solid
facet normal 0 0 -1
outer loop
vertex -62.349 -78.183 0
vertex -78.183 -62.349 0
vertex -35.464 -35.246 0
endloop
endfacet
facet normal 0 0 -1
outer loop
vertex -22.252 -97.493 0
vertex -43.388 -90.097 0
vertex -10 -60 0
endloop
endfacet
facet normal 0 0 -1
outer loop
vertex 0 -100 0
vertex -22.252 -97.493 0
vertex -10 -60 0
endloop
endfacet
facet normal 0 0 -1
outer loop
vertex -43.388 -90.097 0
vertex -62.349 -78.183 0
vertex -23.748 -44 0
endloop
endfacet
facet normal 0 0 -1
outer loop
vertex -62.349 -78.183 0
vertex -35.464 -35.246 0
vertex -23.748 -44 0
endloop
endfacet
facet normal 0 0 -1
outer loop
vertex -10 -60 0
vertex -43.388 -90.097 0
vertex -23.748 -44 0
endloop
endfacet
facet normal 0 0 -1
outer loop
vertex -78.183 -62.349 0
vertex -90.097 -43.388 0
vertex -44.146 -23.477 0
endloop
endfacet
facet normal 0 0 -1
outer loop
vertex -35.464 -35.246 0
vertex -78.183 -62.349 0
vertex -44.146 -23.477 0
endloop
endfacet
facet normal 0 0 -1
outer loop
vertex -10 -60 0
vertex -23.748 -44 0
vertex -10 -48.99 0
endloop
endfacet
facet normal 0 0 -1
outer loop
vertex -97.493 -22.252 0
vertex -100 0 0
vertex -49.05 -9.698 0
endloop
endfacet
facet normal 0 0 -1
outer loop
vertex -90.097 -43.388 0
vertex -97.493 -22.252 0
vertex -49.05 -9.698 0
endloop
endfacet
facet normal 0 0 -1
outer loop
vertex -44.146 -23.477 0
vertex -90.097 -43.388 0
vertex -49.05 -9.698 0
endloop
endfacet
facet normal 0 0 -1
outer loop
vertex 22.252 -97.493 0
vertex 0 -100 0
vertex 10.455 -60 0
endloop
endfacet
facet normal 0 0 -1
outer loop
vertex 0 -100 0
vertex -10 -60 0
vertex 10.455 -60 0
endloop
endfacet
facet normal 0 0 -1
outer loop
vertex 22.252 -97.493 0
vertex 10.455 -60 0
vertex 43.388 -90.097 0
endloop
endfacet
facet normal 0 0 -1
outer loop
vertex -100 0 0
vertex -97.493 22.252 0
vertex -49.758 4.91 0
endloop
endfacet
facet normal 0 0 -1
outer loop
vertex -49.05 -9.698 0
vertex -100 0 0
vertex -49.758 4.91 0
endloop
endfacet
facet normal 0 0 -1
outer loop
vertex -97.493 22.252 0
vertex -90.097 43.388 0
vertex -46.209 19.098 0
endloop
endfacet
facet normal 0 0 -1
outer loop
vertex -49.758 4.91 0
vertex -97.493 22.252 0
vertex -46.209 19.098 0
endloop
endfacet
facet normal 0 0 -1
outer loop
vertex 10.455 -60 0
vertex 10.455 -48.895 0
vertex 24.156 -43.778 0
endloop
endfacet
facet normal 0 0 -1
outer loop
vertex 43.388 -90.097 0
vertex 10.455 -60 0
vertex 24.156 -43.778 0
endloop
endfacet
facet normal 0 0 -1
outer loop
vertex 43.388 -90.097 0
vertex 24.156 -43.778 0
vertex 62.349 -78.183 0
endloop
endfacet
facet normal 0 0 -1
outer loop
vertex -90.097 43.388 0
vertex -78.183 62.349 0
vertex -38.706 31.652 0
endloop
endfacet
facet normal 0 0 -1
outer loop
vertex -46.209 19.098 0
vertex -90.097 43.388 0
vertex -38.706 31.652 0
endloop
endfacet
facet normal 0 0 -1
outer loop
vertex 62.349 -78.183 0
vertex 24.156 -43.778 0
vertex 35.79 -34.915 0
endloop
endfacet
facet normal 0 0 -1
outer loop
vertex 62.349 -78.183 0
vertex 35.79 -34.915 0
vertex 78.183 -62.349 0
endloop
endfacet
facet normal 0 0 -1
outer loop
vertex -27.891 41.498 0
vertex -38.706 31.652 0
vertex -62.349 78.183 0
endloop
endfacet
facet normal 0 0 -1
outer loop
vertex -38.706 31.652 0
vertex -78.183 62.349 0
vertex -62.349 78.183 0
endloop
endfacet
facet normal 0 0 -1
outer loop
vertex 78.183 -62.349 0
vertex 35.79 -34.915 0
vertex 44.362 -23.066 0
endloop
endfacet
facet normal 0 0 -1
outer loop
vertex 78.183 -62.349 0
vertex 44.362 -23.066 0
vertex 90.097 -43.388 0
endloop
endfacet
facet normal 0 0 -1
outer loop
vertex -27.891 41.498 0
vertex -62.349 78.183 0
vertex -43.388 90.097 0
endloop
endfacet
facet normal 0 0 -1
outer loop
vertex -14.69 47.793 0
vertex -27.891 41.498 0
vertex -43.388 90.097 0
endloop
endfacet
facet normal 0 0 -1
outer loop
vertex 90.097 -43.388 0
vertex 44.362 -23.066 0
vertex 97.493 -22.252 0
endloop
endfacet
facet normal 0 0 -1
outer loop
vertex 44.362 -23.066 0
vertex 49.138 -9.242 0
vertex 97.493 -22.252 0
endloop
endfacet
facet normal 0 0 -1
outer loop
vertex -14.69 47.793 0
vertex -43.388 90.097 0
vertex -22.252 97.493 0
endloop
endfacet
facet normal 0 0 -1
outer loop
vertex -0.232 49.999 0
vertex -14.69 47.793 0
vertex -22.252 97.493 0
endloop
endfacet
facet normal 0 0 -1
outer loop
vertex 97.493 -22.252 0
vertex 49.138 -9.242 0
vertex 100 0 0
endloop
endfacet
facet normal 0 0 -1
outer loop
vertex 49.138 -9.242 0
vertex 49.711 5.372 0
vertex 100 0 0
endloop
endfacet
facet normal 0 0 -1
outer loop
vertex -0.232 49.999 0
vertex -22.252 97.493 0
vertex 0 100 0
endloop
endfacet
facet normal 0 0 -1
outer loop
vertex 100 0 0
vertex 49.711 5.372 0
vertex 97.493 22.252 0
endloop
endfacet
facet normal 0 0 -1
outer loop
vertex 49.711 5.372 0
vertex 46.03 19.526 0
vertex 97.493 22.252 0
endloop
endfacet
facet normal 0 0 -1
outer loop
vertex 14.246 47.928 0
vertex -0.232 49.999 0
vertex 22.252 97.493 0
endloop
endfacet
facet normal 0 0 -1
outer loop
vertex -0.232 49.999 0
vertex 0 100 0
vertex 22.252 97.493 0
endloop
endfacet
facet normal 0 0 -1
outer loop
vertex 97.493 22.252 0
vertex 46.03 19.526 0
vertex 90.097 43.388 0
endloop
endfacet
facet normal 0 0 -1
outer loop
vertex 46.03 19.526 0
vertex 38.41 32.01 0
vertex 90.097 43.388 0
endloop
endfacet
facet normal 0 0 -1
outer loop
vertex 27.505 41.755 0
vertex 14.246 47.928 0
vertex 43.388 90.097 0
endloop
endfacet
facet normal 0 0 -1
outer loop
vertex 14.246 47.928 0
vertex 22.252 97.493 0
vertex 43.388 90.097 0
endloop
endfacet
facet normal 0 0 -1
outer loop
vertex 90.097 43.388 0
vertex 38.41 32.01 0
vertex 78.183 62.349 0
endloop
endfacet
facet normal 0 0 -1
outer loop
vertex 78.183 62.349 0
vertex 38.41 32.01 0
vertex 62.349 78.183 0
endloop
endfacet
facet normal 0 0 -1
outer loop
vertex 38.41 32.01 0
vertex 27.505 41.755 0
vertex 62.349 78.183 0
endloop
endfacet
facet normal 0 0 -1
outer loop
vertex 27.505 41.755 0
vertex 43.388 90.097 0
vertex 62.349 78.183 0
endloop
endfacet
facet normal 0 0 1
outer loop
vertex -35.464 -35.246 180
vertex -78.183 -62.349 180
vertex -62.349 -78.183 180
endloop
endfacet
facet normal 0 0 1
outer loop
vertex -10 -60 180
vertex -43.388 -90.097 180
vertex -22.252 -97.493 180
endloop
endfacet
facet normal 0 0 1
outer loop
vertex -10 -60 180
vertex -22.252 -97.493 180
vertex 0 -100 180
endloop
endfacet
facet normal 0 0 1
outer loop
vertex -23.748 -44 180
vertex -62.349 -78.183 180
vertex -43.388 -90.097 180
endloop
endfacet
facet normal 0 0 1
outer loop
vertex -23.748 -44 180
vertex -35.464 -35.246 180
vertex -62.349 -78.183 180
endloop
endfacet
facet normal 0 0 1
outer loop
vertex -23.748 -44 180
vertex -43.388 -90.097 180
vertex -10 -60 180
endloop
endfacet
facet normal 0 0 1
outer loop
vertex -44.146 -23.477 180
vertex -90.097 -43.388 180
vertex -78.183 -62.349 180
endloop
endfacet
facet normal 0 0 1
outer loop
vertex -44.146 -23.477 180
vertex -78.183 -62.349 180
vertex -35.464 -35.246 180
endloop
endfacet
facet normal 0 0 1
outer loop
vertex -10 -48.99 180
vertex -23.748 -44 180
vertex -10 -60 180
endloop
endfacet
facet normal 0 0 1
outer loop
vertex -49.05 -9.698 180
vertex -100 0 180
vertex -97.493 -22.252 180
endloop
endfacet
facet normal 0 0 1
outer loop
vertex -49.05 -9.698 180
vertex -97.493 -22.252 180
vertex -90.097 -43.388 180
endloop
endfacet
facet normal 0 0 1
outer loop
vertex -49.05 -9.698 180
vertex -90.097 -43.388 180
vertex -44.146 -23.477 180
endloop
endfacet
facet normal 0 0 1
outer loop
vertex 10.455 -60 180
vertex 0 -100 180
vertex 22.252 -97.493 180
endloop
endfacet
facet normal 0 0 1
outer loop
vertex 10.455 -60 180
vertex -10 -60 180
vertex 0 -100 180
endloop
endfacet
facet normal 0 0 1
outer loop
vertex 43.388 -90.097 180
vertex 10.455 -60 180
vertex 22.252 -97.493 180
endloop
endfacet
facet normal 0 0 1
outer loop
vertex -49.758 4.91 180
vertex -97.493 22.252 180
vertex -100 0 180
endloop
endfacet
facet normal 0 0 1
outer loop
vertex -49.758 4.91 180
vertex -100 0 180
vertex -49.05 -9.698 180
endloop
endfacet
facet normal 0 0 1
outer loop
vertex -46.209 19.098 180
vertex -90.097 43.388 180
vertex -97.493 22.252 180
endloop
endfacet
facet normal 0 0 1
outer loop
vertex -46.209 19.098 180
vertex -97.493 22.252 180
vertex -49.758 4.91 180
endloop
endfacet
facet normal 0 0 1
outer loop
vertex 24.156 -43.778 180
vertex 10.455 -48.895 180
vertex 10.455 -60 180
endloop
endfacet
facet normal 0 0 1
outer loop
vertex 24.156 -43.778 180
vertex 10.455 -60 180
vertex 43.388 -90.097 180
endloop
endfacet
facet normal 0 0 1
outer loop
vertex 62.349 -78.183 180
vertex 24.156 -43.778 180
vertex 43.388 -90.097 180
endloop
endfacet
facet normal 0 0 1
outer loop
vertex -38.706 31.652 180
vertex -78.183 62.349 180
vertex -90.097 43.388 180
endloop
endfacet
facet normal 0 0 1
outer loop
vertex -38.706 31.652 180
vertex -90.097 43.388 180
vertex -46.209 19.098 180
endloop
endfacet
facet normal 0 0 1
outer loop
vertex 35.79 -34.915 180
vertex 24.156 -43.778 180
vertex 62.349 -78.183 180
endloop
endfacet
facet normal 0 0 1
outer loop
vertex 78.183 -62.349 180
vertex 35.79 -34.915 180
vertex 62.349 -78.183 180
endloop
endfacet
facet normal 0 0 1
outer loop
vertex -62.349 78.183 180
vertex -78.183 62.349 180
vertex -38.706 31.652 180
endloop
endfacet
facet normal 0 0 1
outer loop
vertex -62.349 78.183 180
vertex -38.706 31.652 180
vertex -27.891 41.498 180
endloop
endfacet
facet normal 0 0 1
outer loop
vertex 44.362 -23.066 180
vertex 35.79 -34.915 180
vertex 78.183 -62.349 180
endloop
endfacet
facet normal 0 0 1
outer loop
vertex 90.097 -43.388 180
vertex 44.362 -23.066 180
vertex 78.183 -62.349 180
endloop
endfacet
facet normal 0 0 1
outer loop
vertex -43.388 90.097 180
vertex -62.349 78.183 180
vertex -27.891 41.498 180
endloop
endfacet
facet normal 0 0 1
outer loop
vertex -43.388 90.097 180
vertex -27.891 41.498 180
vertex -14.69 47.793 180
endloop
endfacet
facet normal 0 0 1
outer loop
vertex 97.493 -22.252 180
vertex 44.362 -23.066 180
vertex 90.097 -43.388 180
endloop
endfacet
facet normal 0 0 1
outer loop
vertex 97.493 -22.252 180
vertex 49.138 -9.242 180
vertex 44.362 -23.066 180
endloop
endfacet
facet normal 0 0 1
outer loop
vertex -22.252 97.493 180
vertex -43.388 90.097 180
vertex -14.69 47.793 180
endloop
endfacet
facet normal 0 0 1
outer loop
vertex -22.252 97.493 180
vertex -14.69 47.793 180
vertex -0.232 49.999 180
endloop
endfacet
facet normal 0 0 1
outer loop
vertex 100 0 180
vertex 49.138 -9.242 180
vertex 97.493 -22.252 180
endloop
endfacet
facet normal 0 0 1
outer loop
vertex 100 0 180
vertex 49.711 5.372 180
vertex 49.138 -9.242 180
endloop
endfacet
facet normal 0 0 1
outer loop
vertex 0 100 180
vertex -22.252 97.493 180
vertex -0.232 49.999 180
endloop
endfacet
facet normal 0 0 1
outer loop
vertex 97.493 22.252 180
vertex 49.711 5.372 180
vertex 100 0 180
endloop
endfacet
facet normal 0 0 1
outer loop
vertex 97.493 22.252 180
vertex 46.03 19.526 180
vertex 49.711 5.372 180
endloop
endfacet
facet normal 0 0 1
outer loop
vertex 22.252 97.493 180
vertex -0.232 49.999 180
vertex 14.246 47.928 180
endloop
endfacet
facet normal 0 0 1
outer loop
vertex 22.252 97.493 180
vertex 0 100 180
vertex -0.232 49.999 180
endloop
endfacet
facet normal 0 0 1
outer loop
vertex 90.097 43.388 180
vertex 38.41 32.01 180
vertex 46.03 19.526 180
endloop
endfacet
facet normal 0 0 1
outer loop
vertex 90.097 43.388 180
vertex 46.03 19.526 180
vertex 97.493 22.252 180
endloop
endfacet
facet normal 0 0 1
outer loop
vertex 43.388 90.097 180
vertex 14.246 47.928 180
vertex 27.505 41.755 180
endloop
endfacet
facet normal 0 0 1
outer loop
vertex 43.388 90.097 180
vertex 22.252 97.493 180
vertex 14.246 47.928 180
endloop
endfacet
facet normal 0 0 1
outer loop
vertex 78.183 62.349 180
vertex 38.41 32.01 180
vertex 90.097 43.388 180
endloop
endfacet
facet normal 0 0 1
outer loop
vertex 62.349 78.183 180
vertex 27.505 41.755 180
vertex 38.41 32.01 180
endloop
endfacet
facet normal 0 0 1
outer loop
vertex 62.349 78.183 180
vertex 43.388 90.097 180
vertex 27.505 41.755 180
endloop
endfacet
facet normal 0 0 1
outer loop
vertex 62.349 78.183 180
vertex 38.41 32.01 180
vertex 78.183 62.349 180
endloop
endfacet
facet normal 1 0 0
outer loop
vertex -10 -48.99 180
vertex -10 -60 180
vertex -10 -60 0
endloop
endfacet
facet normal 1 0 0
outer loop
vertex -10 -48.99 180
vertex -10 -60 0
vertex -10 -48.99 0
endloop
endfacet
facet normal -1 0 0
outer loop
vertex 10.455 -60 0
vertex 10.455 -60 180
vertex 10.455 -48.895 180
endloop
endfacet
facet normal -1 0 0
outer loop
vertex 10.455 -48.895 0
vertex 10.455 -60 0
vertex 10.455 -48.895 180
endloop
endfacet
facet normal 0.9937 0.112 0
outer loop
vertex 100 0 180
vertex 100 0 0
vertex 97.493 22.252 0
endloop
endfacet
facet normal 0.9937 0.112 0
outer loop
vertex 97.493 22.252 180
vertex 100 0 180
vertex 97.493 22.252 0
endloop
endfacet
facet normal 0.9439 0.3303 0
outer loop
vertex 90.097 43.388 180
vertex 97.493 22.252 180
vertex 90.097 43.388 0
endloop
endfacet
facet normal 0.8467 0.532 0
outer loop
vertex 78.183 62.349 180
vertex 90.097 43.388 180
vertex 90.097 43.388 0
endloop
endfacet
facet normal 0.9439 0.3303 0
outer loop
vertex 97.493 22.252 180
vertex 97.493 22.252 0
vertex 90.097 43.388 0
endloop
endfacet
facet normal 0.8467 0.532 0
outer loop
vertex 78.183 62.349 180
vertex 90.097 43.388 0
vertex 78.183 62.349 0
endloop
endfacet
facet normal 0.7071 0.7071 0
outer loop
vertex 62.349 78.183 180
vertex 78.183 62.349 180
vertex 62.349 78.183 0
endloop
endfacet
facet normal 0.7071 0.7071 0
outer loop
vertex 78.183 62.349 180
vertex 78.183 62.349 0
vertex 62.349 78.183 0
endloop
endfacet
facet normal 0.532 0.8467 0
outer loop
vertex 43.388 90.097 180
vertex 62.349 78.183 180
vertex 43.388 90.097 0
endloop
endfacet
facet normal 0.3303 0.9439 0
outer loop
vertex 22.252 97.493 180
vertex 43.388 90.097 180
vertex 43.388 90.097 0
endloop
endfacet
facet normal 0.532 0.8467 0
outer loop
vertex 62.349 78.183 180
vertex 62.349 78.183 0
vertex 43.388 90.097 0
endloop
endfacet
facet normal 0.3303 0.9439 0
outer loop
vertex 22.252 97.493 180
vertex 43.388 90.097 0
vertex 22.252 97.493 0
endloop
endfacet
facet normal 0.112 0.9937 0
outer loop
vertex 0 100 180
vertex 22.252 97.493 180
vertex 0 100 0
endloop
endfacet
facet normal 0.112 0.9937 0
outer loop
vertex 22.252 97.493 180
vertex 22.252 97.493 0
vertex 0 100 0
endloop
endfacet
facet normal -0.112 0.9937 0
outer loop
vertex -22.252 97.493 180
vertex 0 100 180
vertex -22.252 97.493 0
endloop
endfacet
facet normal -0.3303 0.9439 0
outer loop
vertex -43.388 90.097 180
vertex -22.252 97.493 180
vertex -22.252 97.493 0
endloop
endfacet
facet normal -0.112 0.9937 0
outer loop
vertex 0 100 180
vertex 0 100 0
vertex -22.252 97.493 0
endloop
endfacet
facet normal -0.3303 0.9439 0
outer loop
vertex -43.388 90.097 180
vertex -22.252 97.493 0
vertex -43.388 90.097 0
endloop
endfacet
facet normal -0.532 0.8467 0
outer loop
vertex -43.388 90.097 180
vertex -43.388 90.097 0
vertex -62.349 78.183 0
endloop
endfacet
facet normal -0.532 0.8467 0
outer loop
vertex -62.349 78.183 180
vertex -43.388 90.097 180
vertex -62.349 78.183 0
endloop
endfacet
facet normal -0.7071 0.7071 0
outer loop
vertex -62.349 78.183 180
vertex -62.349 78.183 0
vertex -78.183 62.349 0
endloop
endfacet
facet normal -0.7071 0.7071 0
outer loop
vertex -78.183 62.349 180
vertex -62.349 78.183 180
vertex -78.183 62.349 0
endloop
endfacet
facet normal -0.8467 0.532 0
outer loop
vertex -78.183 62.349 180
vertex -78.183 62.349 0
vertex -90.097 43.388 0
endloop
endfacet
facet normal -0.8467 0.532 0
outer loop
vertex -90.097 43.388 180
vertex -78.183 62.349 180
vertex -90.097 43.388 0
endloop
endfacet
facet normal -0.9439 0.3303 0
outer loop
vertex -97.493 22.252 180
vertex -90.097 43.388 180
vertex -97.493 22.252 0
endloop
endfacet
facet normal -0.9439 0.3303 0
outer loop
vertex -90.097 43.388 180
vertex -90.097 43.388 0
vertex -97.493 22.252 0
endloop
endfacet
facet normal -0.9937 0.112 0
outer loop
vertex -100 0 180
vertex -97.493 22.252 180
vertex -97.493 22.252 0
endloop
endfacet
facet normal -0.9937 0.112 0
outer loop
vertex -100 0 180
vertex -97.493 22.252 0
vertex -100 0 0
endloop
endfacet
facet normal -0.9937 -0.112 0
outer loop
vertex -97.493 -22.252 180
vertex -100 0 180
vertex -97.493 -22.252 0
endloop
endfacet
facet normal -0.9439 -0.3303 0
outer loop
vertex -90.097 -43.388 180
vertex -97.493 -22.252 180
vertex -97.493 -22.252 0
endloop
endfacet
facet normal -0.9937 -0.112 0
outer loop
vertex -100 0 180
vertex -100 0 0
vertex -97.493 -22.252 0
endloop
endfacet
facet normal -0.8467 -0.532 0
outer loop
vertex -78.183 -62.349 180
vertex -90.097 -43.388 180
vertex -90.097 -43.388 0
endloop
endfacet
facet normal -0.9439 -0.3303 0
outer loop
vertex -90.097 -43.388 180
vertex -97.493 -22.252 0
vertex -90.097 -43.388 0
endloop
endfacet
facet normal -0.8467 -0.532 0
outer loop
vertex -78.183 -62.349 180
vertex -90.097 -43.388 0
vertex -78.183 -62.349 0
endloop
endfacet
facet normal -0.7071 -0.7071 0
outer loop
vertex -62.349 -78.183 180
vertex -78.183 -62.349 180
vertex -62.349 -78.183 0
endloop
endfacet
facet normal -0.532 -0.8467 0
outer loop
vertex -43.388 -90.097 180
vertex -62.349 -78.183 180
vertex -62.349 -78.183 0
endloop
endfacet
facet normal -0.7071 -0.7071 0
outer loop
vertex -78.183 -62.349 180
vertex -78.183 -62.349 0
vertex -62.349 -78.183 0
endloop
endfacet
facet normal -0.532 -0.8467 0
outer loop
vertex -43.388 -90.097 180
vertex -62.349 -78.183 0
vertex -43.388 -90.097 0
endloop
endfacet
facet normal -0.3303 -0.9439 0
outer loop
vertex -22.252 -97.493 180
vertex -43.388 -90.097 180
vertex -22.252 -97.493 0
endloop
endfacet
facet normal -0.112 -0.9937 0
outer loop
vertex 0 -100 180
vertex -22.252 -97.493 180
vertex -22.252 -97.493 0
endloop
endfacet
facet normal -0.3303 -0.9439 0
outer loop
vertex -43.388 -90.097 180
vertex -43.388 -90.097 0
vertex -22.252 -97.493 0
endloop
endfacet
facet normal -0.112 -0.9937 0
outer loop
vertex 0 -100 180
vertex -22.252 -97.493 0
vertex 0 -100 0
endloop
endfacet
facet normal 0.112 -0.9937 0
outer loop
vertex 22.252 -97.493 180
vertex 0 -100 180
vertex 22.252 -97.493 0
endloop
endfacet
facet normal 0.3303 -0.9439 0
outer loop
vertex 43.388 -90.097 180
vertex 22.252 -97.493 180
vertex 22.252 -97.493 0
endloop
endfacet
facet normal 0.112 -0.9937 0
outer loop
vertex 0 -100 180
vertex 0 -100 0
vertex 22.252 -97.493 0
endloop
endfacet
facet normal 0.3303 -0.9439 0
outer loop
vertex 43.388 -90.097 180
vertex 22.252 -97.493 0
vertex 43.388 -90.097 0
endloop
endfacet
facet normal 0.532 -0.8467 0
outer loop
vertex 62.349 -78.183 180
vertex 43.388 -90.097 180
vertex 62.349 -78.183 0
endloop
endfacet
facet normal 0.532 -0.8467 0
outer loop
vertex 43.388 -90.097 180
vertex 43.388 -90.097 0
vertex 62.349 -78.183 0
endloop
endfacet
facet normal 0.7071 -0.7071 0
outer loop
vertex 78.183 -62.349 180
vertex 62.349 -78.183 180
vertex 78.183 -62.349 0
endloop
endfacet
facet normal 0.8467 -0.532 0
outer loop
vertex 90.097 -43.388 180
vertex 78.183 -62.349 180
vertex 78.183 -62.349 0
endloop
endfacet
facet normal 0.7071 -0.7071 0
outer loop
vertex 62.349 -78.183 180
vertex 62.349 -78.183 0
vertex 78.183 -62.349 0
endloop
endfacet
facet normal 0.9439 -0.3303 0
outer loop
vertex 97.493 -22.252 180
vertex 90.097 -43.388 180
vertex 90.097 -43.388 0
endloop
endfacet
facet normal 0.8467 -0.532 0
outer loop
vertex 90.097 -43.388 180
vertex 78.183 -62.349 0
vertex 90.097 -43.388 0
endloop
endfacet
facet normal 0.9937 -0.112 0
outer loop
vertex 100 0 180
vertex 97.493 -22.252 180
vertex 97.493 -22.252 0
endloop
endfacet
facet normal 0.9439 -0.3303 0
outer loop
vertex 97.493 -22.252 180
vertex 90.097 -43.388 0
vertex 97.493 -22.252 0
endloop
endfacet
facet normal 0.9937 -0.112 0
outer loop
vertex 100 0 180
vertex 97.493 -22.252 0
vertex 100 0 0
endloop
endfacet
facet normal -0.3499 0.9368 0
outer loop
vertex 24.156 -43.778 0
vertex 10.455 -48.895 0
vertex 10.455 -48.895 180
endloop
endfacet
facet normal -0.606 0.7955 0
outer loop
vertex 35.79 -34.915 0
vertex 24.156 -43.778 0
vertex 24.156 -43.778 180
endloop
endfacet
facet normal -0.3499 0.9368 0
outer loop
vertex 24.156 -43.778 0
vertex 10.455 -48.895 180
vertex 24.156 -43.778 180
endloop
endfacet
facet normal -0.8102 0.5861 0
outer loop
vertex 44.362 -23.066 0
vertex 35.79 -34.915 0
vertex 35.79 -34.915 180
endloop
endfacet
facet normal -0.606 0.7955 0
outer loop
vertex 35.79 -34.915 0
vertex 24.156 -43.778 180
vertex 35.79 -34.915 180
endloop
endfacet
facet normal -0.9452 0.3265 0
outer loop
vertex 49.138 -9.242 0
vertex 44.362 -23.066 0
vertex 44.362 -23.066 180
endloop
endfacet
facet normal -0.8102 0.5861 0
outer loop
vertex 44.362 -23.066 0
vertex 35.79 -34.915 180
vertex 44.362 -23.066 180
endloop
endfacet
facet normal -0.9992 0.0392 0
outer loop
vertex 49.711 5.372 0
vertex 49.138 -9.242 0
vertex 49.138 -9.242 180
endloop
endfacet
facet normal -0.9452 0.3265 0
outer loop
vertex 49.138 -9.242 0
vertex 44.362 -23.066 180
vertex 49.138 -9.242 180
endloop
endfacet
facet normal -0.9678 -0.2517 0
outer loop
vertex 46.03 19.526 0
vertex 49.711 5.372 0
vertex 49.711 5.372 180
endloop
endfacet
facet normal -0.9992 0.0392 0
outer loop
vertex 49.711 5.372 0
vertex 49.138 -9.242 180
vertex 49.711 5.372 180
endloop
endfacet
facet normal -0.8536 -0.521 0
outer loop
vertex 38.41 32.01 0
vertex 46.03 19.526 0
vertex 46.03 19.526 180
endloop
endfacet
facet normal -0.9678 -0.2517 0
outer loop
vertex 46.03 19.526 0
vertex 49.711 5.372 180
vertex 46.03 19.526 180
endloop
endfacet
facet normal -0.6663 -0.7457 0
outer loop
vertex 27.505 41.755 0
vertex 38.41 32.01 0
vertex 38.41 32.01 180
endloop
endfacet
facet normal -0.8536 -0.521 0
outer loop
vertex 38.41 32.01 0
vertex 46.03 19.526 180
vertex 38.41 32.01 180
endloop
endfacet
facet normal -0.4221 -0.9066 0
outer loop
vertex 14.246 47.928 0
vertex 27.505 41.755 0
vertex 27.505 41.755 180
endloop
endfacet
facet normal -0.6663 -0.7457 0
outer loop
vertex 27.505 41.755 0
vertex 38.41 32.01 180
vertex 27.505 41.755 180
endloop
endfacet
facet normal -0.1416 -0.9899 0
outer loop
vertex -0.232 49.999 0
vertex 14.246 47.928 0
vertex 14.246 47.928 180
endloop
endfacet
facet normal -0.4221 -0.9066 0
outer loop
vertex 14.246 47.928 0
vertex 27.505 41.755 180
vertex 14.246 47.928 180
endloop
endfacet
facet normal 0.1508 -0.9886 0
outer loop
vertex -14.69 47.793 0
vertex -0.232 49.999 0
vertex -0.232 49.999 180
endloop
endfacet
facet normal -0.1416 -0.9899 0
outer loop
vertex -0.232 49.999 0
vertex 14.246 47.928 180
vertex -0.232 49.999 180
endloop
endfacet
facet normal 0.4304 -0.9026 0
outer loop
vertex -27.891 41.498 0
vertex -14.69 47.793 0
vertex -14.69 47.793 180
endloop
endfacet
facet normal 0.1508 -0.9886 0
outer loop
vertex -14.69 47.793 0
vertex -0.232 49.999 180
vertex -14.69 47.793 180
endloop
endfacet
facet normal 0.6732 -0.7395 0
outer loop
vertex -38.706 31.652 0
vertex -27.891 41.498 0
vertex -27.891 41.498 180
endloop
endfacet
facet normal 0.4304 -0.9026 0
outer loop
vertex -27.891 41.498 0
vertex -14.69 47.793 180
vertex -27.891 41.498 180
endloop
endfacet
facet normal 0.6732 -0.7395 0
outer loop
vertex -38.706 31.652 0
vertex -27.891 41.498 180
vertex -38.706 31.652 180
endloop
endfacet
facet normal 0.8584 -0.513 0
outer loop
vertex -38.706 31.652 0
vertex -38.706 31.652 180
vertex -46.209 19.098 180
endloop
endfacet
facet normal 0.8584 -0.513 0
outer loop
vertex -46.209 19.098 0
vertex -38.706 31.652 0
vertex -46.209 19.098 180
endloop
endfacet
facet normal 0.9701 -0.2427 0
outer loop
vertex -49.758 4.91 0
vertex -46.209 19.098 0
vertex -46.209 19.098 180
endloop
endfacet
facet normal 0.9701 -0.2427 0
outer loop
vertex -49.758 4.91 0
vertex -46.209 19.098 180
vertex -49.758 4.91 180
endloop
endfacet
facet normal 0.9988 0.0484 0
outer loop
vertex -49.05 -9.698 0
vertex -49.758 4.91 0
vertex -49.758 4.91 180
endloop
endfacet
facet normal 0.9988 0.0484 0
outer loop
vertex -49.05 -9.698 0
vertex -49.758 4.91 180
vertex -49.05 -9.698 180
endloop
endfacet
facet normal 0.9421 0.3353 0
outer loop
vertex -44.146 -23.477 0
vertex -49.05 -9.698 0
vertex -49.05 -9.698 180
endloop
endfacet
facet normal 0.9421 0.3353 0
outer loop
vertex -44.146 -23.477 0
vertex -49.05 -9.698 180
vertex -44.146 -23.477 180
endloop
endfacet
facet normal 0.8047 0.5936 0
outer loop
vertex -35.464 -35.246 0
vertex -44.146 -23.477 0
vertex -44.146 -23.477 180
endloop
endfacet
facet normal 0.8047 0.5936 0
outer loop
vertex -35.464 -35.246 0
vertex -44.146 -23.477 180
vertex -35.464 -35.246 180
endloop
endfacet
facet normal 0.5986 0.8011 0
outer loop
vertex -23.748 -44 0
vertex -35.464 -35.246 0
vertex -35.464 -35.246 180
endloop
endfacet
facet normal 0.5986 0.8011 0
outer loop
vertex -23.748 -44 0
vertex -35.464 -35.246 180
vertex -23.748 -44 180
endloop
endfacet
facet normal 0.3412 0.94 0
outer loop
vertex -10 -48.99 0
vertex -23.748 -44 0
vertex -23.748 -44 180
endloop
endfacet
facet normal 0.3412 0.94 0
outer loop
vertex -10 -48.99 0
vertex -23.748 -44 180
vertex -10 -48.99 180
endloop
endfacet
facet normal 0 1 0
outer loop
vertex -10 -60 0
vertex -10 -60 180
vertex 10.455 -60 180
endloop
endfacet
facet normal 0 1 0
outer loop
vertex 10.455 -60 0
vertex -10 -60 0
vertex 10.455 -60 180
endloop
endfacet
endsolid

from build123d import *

# Parameters (mm, degrees)
F0_R     = 100
F1_DEPTH = 180
F2_R     = 50
F3_DEPTH = 180.001
F4_W     = 20.454546
F4_H     = 19.62437
F5_DEPTH = 180.001


with BuildPart() as f1:
    # F0 (on Top) → F1 (new body)
    with BuildSketch(Plane.XY):
        Circle(F0_R)
    extrude(amount=F1_DEPTH)

    # F2 (on face) → F3 (cut, through all)
    with BuildSketch(Plane.XY.offset(180)):
        Circle(F2_R)
    extrude(amount=-F3_DEPTH, mode=Mode.SUBTRACT)

    # F4 (on face) → F5 (cut, through all)
    with BuildSketch(Plane.XY.offset(180)):
        with Locations((0.227273, -50.187815)):
            Rectangle(F4_W, F4_H)
    extrude(amount=-F5_DEPTH, mode=Mode.SUBTRACT)


solid = f1.part
